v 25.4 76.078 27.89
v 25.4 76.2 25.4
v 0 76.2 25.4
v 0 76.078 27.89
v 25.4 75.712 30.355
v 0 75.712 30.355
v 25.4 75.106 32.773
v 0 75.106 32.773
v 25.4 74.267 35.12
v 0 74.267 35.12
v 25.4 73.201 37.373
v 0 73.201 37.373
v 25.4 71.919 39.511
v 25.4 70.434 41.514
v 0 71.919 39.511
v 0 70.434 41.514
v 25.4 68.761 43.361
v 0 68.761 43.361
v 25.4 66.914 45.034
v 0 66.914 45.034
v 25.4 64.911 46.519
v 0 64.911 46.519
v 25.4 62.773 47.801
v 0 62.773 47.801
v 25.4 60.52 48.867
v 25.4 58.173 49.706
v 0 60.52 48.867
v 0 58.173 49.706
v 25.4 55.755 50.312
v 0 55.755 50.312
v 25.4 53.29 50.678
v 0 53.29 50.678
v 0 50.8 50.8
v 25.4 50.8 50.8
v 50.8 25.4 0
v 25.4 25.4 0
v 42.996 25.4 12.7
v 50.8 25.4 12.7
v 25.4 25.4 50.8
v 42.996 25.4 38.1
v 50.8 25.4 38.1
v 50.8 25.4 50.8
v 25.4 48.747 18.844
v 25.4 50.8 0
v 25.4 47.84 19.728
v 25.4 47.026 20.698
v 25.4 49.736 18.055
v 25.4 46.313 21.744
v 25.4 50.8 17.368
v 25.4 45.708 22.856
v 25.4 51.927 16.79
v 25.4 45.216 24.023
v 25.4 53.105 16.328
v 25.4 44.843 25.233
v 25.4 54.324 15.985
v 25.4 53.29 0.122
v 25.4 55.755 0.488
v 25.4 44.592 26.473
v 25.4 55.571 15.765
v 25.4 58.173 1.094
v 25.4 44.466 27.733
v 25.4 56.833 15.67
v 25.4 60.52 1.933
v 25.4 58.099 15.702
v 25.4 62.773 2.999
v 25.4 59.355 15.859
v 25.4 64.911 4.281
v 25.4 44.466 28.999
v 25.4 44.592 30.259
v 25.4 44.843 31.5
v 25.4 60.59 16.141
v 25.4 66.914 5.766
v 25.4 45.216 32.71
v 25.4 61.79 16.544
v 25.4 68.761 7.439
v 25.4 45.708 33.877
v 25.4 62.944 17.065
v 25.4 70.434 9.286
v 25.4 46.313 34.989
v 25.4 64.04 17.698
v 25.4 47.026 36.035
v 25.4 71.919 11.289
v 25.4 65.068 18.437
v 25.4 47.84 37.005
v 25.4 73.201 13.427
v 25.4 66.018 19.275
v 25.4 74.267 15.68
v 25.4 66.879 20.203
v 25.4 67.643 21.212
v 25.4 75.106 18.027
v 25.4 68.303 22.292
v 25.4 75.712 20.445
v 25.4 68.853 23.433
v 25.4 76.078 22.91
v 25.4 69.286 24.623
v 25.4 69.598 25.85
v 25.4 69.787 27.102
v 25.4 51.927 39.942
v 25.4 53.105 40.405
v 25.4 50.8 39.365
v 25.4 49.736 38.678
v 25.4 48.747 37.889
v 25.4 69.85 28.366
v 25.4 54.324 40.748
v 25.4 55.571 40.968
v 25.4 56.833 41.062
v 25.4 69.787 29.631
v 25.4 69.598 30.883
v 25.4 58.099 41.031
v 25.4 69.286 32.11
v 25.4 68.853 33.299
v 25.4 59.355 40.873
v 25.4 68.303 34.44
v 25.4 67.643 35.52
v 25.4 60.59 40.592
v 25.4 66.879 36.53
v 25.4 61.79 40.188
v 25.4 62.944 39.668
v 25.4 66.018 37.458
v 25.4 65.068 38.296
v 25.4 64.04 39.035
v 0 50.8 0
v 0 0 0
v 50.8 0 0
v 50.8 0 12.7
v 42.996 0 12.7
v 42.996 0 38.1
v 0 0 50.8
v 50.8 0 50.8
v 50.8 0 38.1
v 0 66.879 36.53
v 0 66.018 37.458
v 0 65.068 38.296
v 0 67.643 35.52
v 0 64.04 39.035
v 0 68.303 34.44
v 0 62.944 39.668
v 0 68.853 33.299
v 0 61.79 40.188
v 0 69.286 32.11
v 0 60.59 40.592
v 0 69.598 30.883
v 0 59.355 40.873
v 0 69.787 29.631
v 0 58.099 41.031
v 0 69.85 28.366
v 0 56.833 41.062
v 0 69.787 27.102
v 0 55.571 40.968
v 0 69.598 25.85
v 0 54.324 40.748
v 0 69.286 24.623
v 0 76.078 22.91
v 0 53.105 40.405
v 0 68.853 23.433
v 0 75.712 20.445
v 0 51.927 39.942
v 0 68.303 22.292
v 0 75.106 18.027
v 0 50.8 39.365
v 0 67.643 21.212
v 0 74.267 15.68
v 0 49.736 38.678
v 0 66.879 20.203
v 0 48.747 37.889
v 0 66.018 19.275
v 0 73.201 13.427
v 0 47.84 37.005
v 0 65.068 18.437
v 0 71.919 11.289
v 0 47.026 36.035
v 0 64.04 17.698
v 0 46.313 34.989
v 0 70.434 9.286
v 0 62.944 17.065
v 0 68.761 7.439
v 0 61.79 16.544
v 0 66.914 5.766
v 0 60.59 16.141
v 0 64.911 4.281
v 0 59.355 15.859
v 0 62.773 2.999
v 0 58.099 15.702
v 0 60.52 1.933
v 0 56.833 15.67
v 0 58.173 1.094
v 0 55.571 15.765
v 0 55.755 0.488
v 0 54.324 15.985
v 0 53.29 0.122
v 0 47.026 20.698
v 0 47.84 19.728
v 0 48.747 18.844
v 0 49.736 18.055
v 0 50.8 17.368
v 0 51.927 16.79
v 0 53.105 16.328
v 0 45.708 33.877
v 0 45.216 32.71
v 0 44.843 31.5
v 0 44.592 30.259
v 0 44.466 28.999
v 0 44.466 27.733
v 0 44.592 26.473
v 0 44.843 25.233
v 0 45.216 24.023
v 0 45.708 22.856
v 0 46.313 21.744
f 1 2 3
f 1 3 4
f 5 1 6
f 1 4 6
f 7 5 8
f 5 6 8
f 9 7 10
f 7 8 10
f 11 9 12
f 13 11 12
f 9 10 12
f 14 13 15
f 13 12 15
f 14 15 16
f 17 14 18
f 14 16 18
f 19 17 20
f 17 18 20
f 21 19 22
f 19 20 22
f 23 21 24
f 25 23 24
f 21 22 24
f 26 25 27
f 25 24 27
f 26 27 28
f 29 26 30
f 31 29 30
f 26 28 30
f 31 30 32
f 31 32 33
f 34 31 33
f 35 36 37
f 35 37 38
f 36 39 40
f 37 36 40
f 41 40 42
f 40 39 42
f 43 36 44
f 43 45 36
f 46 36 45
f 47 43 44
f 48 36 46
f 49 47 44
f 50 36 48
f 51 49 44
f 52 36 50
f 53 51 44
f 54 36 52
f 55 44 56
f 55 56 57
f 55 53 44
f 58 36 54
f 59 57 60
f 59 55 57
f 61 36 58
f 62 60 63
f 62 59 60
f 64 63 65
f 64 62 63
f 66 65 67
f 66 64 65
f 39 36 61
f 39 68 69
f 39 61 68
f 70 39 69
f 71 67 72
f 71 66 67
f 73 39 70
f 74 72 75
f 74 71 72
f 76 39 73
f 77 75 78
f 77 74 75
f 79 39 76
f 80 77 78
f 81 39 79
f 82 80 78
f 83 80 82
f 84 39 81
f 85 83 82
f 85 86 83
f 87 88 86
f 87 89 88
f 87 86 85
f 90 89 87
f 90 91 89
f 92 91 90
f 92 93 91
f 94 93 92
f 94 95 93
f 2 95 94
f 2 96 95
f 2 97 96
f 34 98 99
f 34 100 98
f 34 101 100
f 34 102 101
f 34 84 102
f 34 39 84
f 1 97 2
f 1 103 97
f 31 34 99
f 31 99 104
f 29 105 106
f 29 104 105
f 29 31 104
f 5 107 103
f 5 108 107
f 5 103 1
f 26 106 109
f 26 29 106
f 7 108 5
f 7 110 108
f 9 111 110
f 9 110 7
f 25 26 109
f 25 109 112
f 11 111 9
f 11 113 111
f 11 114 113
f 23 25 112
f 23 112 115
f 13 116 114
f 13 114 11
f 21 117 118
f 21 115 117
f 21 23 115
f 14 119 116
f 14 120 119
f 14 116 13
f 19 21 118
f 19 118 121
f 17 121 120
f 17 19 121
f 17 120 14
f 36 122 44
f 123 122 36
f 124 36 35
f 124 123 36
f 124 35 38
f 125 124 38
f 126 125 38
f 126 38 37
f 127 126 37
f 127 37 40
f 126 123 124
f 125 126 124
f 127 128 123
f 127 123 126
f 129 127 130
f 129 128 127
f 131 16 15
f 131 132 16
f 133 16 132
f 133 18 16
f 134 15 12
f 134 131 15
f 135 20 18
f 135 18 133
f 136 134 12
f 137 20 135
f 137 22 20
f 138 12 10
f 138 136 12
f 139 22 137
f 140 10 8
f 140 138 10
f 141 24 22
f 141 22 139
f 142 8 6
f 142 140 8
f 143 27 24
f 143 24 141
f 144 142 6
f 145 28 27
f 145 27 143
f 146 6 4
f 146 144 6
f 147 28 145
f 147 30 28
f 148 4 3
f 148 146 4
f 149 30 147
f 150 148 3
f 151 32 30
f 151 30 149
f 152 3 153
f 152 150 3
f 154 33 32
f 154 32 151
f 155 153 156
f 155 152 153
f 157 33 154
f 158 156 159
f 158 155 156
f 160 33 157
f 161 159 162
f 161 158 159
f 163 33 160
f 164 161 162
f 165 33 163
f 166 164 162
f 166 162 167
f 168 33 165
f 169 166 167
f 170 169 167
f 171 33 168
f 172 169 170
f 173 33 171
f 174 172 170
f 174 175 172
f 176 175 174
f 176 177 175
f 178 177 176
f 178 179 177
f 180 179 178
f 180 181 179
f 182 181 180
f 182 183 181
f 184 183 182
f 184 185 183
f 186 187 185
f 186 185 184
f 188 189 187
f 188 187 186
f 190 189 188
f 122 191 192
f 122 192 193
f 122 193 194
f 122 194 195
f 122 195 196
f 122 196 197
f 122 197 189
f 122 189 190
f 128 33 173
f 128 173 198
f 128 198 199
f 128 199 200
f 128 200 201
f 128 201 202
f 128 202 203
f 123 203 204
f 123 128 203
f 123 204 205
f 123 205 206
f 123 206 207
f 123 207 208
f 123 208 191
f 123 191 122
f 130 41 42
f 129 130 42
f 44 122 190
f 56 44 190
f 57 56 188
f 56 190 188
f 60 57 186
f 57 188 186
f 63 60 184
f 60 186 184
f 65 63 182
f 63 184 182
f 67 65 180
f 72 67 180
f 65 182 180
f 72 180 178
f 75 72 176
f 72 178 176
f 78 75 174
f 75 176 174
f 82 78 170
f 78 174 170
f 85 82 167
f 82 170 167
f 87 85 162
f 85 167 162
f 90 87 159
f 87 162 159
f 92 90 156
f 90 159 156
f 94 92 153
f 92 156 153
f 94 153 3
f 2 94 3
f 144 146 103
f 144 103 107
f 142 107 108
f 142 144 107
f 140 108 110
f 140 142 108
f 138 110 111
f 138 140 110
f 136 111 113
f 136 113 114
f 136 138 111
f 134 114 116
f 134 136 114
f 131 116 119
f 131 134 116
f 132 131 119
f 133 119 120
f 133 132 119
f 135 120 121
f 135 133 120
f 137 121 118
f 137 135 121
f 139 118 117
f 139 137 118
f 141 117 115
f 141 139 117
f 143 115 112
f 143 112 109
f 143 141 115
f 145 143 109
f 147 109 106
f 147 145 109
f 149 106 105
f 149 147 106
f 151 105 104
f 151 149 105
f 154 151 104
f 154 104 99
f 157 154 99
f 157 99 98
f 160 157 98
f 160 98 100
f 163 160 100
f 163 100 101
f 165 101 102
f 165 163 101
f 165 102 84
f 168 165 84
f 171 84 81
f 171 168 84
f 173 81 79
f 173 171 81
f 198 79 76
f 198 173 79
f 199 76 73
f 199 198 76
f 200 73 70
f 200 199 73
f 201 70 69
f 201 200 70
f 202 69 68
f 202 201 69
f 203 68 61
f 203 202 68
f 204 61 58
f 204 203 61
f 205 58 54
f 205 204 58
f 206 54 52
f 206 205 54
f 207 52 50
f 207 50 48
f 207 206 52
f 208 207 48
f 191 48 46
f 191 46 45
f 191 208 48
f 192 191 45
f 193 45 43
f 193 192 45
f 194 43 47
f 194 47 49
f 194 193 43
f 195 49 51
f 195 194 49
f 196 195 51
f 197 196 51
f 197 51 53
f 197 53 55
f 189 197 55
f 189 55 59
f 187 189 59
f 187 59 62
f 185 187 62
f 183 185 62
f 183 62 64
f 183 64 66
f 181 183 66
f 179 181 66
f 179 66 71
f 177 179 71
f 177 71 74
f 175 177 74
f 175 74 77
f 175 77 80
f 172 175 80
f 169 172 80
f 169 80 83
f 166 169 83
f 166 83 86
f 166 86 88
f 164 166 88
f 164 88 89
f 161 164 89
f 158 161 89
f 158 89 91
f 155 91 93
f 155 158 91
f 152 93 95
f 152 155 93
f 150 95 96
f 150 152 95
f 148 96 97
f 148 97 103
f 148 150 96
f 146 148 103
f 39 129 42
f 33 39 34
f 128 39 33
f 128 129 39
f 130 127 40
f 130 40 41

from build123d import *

# Parameters (mm, degrees)
F2_DEPTH = 25.4
F1_W     = 25.4
F1_H     = 50.8
F1_R     = 12.7
F3_DEPTH = 25.4


with BuildPart() as f2:
    # F0 (on Front) → F2 (new body)
    with BuildSketch(Plane.XZ):
        Polygon((0, 50.8), (0, 0), (50.8, 0), (50.8, 12.7), (42.995947, 12.7), (42.995947, 38.1), (50.8, 38.1), (50.8, 50.8), align=None)
    extrude(amount=-F2_DEPTH)

    # F1 (on Right) → F3 (join)
    with BuildSketch(Plane.YZ):
        with Locations((12.7, 25.4)):
            Rectangle(F1_W, F1_H)
        with BuildLine():
            Line((25.4, 50.8), (25.4, 0))
            Line((25.4, 0), (50.8, 0))
            ThreePointArc((50.8, 0), (68.760512, 7.439488), (76.2, 25.4))
            ThreePointArc((76.2, 25.4), (68.760512, 43.360512), (50.8, 50.8))
            Line((50.8, 50.8), (25.4, 50.8))
        make_face()
        with Locations((57.15, 28.366325)):
            Circle(F1_R, mode=Mode.SUBTRACT)
    extrude(amount=F3_DEPTH)


solid = f2.part
